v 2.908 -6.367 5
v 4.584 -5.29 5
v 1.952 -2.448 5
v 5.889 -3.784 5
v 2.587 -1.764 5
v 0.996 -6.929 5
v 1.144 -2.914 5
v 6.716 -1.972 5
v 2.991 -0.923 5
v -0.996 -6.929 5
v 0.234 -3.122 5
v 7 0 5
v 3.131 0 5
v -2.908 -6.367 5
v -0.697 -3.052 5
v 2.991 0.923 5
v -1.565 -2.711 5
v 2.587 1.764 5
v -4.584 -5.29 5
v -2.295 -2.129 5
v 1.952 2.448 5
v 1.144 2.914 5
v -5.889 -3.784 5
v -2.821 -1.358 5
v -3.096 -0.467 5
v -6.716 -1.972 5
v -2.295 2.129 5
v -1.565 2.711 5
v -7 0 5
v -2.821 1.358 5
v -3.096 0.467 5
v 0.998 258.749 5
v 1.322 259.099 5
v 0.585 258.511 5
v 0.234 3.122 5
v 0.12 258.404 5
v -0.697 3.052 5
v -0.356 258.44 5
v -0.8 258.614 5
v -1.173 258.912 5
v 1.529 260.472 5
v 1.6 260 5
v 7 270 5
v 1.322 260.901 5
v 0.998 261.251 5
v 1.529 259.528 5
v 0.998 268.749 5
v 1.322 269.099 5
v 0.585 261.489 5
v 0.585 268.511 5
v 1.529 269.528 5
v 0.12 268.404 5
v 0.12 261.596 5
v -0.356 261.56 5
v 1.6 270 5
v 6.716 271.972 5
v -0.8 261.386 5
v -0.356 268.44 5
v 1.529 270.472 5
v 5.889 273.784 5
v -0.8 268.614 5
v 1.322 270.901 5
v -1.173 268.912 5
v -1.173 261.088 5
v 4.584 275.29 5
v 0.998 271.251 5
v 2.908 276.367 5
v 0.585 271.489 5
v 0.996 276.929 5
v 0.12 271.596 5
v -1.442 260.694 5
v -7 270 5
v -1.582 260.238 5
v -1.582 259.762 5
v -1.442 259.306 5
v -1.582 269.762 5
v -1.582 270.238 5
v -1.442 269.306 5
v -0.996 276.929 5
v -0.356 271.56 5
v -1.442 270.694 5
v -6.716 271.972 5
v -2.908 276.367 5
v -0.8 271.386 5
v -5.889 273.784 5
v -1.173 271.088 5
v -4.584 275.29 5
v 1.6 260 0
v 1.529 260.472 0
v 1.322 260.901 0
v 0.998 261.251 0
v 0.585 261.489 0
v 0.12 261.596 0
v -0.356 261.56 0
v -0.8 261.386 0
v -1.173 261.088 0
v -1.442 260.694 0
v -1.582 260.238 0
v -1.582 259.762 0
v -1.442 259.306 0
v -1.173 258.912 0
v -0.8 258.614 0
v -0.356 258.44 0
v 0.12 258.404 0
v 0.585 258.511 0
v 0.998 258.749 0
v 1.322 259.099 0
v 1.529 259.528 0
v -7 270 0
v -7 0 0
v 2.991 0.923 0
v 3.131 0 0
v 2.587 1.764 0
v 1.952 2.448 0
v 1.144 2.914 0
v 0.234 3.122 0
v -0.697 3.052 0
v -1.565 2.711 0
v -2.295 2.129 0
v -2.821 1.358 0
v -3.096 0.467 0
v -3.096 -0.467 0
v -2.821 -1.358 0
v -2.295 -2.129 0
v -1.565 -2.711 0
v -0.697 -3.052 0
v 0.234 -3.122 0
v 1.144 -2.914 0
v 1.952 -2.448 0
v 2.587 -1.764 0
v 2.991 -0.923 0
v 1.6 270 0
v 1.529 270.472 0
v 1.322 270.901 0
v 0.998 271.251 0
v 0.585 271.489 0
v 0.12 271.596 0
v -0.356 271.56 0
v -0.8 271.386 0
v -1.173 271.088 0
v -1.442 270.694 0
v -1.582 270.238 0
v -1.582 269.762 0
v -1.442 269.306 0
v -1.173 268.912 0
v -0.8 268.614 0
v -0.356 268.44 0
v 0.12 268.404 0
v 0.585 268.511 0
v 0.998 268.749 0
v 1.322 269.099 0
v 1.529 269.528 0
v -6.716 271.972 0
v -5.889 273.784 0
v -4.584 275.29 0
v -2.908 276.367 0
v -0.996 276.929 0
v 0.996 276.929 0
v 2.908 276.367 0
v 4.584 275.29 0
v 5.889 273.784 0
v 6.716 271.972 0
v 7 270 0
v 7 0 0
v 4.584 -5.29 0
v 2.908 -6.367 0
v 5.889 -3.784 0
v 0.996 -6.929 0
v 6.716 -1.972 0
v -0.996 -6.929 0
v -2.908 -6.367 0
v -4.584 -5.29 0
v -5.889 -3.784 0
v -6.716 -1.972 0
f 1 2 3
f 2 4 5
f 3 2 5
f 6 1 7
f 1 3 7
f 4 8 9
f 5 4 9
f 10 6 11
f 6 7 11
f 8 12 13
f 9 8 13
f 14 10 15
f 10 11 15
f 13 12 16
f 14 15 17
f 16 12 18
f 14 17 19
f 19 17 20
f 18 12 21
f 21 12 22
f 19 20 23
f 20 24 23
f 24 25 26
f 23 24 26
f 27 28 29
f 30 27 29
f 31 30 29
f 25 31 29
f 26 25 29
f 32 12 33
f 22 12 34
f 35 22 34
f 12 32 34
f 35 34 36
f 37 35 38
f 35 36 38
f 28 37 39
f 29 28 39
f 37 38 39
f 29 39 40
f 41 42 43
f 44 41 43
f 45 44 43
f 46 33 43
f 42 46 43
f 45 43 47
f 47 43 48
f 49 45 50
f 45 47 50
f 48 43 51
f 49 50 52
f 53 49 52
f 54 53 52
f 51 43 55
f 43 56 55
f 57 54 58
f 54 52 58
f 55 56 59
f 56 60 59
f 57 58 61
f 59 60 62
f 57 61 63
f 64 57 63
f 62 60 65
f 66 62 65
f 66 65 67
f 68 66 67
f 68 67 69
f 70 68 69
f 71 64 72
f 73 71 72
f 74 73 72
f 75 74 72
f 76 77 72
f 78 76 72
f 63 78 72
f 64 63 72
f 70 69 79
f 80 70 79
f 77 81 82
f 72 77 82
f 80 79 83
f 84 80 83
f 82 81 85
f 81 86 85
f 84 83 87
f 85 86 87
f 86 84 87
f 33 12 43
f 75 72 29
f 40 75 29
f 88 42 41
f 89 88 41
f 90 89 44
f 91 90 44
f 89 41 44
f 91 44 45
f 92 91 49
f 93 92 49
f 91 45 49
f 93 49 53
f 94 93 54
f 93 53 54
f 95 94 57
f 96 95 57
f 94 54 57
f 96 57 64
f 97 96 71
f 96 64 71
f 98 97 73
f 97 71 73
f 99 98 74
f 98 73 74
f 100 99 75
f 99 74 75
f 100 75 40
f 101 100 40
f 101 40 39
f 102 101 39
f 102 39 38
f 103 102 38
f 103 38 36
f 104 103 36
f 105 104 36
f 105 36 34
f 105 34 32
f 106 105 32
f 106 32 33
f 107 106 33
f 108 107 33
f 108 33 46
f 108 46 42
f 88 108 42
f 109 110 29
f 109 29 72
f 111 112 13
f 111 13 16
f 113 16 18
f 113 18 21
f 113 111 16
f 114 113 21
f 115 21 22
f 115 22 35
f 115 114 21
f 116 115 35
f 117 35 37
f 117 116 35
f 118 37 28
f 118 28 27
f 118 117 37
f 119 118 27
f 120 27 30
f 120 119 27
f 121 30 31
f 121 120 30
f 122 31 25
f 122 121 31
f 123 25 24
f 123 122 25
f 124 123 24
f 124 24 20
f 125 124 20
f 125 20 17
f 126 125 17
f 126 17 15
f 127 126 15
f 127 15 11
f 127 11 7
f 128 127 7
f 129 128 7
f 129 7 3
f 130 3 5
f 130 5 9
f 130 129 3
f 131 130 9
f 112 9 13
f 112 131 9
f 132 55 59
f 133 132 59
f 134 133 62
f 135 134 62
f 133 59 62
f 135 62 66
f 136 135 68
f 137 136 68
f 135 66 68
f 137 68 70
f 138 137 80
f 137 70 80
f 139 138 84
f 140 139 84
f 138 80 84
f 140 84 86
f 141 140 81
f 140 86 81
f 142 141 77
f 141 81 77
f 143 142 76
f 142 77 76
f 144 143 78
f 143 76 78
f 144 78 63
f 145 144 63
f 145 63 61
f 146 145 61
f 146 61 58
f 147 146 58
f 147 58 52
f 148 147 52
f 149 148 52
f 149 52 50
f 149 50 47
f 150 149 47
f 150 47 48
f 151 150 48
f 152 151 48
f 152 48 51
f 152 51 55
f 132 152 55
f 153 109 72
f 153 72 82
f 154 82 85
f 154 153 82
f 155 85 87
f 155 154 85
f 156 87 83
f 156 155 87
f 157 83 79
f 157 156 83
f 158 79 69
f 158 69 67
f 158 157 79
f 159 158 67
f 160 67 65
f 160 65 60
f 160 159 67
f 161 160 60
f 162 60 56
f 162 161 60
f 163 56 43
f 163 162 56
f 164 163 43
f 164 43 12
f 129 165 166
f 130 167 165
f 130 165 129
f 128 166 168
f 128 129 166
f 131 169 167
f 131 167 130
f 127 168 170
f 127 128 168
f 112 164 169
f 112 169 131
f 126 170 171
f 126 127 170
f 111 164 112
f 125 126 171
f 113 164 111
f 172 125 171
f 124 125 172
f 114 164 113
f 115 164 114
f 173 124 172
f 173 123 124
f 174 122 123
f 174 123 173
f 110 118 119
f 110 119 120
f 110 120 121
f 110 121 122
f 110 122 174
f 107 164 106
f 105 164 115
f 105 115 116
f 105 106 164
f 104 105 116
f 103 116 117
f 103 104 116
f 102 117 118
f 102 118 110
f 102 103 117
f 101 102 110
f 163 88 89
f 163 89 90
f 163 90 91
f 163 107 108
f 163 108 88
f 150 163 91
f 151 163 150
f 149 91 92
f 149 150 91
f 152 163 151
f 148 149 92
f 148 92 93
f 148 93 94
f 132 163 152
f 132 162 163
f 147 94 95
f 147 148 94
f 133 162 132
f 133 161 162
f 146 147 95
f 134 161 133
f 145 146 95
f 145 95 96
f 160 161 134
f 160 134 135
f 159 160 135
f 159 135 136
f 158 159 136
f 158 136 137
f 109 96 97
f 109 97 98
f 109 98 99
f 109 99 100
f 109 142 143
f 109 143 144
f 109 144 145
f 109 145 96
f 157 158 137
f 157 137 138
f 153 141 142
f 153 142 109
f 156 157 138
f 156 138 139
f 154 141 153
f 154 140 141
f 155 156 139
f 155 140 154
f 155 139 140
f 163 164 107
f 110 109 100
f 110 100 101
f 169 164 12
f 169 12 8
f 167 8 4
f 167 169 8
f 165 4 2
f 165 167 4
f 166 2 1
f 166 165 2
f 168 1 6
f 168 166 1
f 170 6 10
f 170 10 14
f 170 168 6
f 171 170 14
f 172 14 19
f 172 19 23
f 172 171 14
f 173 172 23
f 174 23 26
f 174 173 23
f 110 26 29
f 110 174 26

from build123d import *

# Parameters (mm, degrees)
SKETCH1_R           = 3.130555183
BOSS_EXTRUDE1_DEPTH = 5
SKETCH2_R           = 1.6
CUT_EXTRUDE1_DEPTH  = 10


with BuildPart() as part:
    # Sketch1 → Boss-Extrude1 (new body)
    with BuildSketch(Plane.XY):
        with BuildLine():
            Line((7, 270), (7, 0))
            ThreePointArc((7, 0), (0, -7), (-7, 0))
            Line((-7, 0), (-7, 270))
            ThreePointArc((-7, 270), (0, 277), (7, 270))
        make_face()
        Circle(SKETCH1_R, mode=Mode.SUBTRACT)
    extrude(amount=BOSS_EXTRUDE1_DEPTH)

    # Sketch2 → Cut-Extrude1 (cut)
    with BuildSketch(Plane.XY.offset(5)):
        with Locations((0, 270)):
            Circle(SKETCH2_R)
        with Locations((0, 260)):
            Circle(SKETCH2_R)
    extrude(amount=-CUT_EXTRUDE1_DEPTH, mode=Mode.SUBTRACT)


solid = part.part
